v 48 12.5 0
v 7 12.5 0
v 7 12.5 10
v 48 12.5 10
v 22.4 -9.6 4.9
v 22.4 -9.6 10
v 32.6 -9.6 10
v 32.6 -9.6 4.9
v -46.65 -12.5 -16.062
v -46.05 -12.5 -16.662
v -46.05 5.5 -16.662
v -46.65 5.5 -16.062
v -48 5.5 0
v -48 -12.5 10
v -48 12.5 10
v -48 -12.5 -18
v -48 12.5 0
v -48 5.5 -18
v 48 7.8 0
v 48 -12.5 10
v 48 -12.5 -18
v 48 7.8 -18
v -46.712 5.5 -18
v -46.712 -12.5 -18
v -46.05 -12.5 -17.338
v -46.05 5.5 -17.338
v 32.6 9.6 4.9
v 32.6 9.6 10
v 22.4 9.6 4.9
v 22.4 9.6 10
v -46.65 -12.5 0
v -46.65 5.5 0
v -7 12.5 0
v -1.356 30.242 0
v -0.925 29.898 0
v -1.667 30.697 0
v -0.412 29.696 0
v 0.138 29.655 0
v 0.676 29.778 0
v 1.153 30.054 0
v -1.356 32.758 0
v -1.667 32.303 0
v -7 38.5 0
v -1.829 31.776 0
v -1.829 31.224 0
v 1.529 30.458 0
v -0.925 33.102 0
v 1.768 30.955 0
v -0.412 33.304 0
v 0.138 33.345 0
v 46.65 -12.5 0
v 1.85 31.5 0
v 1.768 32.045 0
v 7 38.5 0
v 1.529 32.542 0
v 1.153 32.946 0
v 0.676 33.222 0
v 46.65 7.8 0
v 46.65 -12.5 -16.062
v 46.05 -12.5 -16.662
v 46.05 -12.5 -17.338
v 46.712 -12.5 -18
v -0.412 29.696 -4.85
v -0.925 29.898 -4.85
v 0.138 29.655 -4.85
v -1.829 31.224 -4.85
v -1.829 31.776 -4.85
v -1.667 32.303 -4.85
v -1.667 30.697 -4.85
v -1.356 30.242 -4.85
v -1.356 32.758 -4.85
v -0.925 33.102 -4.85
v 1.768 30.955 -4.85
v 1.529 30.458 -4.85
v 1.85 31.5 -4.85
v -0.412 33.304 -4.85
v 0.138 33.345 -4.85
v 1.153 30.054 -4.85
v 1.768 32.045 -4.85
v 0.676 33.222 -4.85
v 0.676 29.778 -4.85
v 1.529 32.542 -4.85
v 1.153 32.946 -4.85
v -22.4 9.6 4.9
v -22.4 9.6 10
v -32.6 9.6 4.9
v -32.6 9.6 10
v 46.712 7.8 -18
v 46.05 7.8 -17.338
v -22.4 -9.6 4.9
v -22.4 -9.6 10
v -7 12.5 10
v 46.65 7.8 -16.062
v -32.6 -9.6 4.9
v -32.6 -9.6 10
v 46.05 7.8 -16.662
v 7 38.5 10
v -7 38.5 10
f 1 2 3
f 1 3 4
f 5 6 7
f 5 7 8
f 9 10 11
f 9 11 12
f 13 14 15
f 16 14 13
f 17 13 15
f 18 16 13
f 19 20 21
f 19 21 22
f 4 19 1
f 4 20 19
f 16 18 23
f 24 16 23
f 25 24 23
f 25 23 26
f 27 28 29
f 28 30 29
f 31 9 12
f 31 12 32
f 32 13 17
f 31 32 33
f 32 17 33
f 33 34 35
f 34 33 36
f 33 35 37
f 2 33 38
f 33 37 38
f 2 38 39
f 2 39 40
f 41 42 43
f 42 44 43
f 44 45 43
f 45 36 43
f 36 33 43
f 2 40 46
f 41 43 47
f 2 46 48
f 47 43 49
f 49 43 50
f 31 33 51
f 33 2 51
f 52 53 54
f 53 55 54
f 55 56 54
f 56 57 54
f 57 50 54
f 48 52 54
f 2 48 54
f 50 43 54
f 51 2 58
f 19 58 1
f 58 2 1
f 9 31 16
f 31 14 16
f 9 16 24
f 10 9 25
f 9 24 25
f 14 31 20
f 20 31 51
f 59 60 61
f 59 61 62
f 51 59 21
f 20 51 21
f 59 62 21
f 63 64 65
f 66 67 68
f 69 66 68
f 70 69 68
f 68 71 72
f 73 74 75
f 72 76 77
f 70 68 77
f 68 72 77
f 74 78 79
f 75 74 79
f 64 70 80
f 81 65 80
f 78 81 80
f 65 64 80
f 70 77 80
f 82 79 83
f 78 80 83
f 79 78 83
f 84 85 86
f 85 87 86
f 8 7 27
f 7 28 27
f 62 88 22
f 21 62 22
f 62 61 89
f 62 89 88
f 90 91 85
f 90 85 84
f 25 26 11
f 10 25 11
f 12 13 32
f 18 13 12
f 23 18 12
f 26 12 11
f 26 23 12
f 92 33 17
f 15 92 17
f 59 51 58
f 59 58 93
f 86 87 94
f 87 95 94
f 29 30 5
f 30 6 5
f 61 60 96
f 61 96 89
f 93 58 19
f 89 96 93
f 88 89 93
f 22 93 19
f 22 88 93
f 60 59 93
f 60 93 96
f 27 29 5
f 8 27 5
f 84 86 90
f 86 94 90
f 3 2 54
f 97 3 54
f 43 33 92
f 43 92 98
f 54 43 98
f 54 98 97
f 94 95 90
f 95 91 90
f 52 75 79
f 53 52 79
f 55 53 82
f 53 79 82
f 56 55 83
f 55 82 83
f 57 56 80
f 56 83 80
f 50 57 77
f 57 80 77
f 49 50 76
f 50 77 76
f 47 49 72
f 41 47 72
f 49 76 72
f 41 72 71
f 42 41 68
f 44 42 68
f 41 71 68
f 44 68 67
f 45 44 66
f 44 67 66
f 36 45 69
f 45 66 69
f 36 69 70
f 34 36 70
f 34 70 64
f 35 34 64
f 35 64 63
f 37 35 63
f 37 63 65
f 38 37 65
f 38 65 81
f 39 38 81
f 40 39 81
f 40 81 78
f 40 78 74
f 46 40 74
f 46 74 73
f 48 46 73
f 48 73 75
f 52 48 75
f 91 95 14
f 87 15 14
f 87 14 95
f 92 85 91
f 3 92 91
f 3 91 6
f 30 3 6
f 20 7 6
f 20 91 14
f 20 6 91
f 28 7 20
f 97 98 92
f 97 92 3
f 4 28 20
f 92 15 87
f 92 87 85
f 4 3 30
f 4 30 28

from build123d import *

# Parameters (mm, degrees)
SKETCH1_W                = 1.5
SKETCH1_H                = 25
SKETCH1_W_2              = 14
SKETCH1_H_2              = 26
SKETCH1_R                = 2
BOSS_EXTRUDE1_DEPTH      = 10
SKETCH1_3_W              = 1.5
SKETCH1_3_H              = 25
BOSS_EXTRUDE2_DEPTH      = 18
SKETCH1_4_R              = 2
BOSS_EXTRUDE3_DEPTH      = 5
BOSS_EXTRUDE4_DEPTH      = 25
CUT_EXTRUDE1_DEPTH       = 4.7
CUT_EXTRUDE2_DEPTH       = 7
SKETCH8_W                = 10
SKETCH8_H                = 19
CUT_EXTRUDE3_DEPTH       = 5
MOVE_START               = -12.5
MOVE_FACE1_DEPTH         = 20.3
MOVE_START_2             = -5
MOVE_FACE1_2_OUTLINE_R   = 2
MOVE_FACE1_2_OUTLINE_R_2 = 1.85
MOVE_FACE1_2_DEPTH       = 5
MOVE_FACE1_3_OUTLINE_R   = 1.85
MOVE_FACE1_3_DEPTH       = 0.15
MOVE_FACE2_BY            = 0.1
MOVE_FACE2_2_BY          = 0.1
MOVE_FACE2_3_BY          = 0.1
MOVE_FACE2_4_BY          = 0.1
MOVE_FACE2_5_BY          = 0.1
MOVE_FACE2_6_BY          = 0.1
MOVE_FACE2_7_BY          = 0.1
MOVE_FACE2_8_BY          = 0.1
MOVE_FACE2_9_BY          = 0.1
MOVE_FACE2_10_BY         = 0.1


# Read off the part's stored shape, not the designer's step: Move Face1
with BuildPart() as part:
    # Sketch1 → Boss-Extrude1 (new body)
    # profile 1 of 5: a face of its own
    with BuildSketch(Plane.XY):
        Polygon((-7, 12.5), (-46.5, 12.5), (-46.5, -12.5), (46.5, -12.5), (46.5, 12.5), (7, 12.5), align=None)
    # profile 2 of 5: a face of its own
    with BuildSketch(Plane.XY):
        with Locations((-47.25, 0)):
            Rectangle(SKETCH1_W, SKETCH1_H)
    # profile 3 of 5: a face of its own
    with BuildSketch(Plane.XY):
        with Locations((47.25, 0)):
            Rectangle(SKETCH1_W, SKETCH1_H)
    # profile 4 of 5: a face of its own
    with BuildSketch(Plane.XY):
        with Locations((0, 25.5)):
            Rectangle(SKETCH1_W_2, SKETCH1_H_2)
        with Locations((0, 31.5)):
            Circle(SKETCH1_R, mode=Mode.SUBTRACT)
    # profile 5 of 5: a face of its own
    with BuildSketch(Plane.XY):
        with Locations((0, 31.5)):
            Circle(SKETCH1_R)
    extrude(amount=BOSS_EXTRUDE1_DEPTH)

    # Sketch1<3> → Boss-Extrude2 (add)
    with BuildSketch(Plane.XY):
        with Locations((47.25, 0)):
            Rectangle(SKETCH1_3_W, SKETCH1_3_H)
        with Locations((-47.25, 0)):
            Rectangle(SKETCH1_3_W, SKETCH1_3_H)
    extrude(amount=-BOSS_EXTRUDE2_DEPTH)

    # Sketch1<4> → Boss-Extrude3 (add)
    with BuildSketch(Plane.XY):
        with Locations((0, 31.5)):
            Circle(SKETCH1_4_R)
    extrude(amount=-BOSS_EXTRUDE3_DEPTH)

    # Sketch5 → Boss-Extrude4 (add)
    with BuildSketch(Plane(origin=(0, 12.5, 0), x_dir=(1, 0, 0), z_dir=(0, 1, 0))):
        Polygon((45.9, 17.4), (45.9, 16.6), (46.5, 16), (46.5, 18), align=None)
        Polygon((-45.9, 17.4), (-46.5, 18), (-46.5, 16), (-45.9, 16.6), align=None)
    extrude(amount=-BOSS_EXTRUDE4_DEPTH)

    # Sketch7 → Cut-Extrude1 (cut)
    with BuildSketch(Plane(origin=(0, 12.5, 0), x_dir=(1, 0, 0), z_dir=(0, 1, 0))):
        Polygon((46.5, 16), (46.5, 0), (48, 0), (48, 18), (46.5, 18), (45.9, 17.4), (45.9, 16.6), align=None)
    extrude(amount=-CUT_EXTRUDE1_DEPTH, mode=Mode.SUBTRACT)

    # Sketch7<4> → Cut-Extrude2 (cut)
    with BuildSketch(Plane(origin=(0, 12.5, 0), x_dir=(1, 0, 0), z_dir=(0, 1, 0))):
        Polygon((-48, 0), (-46.5, 0), (-46.5, 16), (-45.9, 16.6), (-45.9, 17.4), (-46.5, 18), (-48, 18), align=None)
    extrude(amount=-CUT_EXTRUDE2_DEPTH, mode=Mode.SUBTRACT)

    # Sketch8 → Cut-Extrude3 (cut)
    with BuildSketch(Plane.XY.offset(10)):
        with Locations((-27.5, 0)):
            Rectangle(SKETCH8_W, SKETCH8_H)
        with Locations((27.5, 0)):
            Rectangle(SKETCH8_W, SKETCH8_H)
    extrude(amount=-CUT_EXTRUDE3_DEPTH, mode=Mode.SUBTRACT)

    # Move Face1 outline → Move Face1 (cut)
    with BuildSketch(Plane(origin=(0, 0, 0), x_dir=(1, 0, 0), z_dir=(0, 1, 0)).offset(MOVE_START)):
        Polygon((-46.05, 16.662132034), (-46.65, 16.062132034), (-46.65, 0), (-46.5, 0), (-46.5, 16), (-45.9, 16.6), (-45.9, 17.4), (-46.5, 18), (-46.712132034, 18), (-46.05, 17.337867966), align=None)
        Polygon((46.5, 16), (46.5, 0), (46.65, 0), (46.65, 16.062132034), (46.05, 16.662132034), (46.05, 17.337867966), (46.712132034, 18), (46.5, 18), (45.9, 17.4), (45.9, 16.6), align=None)
    extrude(amount=MOVE_FACE1_DEPTH, mode=Mode.SUBTRACT)

    # Move Face1 2 outline → Move Face1 2 (cut)
    with BuildSketch(Plane.XY.offset(MOVE_START_2)):
        with Locations((0, 31.5)):
            Circle(MOVE_FACE1_2_OUTLINE_R)
        with Locations((0, 31.5)):
            Circle(MOVE_FACE1_2_OUTLINE_R_2, mode=Mode.SUBTRACT)
    extrude(amount=MOVE_FACE1_2_DEPTH, mode=Mode.SUBTRACT)

    # Move Face1 3 outline → Move Face1 3 (cut)
    with BuildSketch(Plane.XY.offset(MOVE_START_2)):
        with Locations((0, 31.5)):
            Circle(MOVE_FACE1_3_OUTLINE_R)
    extrude(amount=MOVE_FACE1_3_DEPTH, mode=Mode.SUBTRACT)

    # Move Face2: a face moved inward by 0.1
    extrude(part.faces().sort_by_distance((-22.5, 0, 7.5))[0], amount=MOVE_FACE2_BY, dir=(1, 0, 0), mode=Mode.SUBTRACT)

    # Move Face2 2: a face moved inward by 0.1
    extrude(part.faces().sort_by_distance((-32.5, 0, 7.5))[0], amount=MOVE_FACE2_2_BY, dir=(-1, 0, 0), mode=Mode.SUBTRACT)

    # Move Face2 3: a face moved inward by 0.1
    extrude(part.faces().sort_by_distance((27.5, -9.5, 7.5))[0], amount=MOVE_FACE2_3_BY, dir=(0, -1, 0), mode=Mode.SUBTRACT)

    # Move Face2 4: a face moved inward by 0.1
    extrude(part.faces().sort_by_distance((22.5, 0, 7.5))[0], amount=MOVE_FACE2_4_BY, dir=(-1, 0, 0), mode=Mode.SUBTRACT)

    # Move Face2 5: a face moved inward by 0.1
    extrude(part.faces().sort_by_distance((32.5, 0, 7.5))[0], amount=MOVE_FACE2_5_BY, dir=(1, 0, 0), mode=Mode.SUBTRACT)

    # Move Face2 6: a face moved inward by 0.1
    extrude(part.faces().sort_by_distance((27.5, 9.5, 7.5))[0], amount=MOVE_FACE2_6_BY, dir=(0, 1, 0), mode=Mode.SUBTRACT)

    # Move Face2 7: a face moved inward by 0.1
    extrude(part.faces().sort_by_distance((27.5, 0, 5))[0], amount=MOVE_FACE2_7_BY, dir=(0, 0, -1), mode=Mode.SUBTRACT)

    # Move Face2 8: a face moved inward by 0.1
    extrude(part.faces().sort_by_distance((-27.5, -9.5, 7.5))[0], amount=MOVE_FACE2_8_BY, dir=(0, -1, 0), mode=Mode.SUBTRACT)

    # Move Face2 9: a face moved inward by 0.1
    extrude(part.faces().sort_by_distance((-27.5, 9.5, 7.5))[0], amount=MOVE_FACE2_9_BY, dir=(0, 1, 0), mode=Mode.SUBTRACT)

    # Move Face2 10: a face moved inward by 0.1
    extrude(part.faces().sort_by_distance((-27.5, 0, 5))[0], amount=MOVE_FACE2_10_BY, dir=(0, 0, -1), mode=Mode.SUBTRACT)


solid = part.part
